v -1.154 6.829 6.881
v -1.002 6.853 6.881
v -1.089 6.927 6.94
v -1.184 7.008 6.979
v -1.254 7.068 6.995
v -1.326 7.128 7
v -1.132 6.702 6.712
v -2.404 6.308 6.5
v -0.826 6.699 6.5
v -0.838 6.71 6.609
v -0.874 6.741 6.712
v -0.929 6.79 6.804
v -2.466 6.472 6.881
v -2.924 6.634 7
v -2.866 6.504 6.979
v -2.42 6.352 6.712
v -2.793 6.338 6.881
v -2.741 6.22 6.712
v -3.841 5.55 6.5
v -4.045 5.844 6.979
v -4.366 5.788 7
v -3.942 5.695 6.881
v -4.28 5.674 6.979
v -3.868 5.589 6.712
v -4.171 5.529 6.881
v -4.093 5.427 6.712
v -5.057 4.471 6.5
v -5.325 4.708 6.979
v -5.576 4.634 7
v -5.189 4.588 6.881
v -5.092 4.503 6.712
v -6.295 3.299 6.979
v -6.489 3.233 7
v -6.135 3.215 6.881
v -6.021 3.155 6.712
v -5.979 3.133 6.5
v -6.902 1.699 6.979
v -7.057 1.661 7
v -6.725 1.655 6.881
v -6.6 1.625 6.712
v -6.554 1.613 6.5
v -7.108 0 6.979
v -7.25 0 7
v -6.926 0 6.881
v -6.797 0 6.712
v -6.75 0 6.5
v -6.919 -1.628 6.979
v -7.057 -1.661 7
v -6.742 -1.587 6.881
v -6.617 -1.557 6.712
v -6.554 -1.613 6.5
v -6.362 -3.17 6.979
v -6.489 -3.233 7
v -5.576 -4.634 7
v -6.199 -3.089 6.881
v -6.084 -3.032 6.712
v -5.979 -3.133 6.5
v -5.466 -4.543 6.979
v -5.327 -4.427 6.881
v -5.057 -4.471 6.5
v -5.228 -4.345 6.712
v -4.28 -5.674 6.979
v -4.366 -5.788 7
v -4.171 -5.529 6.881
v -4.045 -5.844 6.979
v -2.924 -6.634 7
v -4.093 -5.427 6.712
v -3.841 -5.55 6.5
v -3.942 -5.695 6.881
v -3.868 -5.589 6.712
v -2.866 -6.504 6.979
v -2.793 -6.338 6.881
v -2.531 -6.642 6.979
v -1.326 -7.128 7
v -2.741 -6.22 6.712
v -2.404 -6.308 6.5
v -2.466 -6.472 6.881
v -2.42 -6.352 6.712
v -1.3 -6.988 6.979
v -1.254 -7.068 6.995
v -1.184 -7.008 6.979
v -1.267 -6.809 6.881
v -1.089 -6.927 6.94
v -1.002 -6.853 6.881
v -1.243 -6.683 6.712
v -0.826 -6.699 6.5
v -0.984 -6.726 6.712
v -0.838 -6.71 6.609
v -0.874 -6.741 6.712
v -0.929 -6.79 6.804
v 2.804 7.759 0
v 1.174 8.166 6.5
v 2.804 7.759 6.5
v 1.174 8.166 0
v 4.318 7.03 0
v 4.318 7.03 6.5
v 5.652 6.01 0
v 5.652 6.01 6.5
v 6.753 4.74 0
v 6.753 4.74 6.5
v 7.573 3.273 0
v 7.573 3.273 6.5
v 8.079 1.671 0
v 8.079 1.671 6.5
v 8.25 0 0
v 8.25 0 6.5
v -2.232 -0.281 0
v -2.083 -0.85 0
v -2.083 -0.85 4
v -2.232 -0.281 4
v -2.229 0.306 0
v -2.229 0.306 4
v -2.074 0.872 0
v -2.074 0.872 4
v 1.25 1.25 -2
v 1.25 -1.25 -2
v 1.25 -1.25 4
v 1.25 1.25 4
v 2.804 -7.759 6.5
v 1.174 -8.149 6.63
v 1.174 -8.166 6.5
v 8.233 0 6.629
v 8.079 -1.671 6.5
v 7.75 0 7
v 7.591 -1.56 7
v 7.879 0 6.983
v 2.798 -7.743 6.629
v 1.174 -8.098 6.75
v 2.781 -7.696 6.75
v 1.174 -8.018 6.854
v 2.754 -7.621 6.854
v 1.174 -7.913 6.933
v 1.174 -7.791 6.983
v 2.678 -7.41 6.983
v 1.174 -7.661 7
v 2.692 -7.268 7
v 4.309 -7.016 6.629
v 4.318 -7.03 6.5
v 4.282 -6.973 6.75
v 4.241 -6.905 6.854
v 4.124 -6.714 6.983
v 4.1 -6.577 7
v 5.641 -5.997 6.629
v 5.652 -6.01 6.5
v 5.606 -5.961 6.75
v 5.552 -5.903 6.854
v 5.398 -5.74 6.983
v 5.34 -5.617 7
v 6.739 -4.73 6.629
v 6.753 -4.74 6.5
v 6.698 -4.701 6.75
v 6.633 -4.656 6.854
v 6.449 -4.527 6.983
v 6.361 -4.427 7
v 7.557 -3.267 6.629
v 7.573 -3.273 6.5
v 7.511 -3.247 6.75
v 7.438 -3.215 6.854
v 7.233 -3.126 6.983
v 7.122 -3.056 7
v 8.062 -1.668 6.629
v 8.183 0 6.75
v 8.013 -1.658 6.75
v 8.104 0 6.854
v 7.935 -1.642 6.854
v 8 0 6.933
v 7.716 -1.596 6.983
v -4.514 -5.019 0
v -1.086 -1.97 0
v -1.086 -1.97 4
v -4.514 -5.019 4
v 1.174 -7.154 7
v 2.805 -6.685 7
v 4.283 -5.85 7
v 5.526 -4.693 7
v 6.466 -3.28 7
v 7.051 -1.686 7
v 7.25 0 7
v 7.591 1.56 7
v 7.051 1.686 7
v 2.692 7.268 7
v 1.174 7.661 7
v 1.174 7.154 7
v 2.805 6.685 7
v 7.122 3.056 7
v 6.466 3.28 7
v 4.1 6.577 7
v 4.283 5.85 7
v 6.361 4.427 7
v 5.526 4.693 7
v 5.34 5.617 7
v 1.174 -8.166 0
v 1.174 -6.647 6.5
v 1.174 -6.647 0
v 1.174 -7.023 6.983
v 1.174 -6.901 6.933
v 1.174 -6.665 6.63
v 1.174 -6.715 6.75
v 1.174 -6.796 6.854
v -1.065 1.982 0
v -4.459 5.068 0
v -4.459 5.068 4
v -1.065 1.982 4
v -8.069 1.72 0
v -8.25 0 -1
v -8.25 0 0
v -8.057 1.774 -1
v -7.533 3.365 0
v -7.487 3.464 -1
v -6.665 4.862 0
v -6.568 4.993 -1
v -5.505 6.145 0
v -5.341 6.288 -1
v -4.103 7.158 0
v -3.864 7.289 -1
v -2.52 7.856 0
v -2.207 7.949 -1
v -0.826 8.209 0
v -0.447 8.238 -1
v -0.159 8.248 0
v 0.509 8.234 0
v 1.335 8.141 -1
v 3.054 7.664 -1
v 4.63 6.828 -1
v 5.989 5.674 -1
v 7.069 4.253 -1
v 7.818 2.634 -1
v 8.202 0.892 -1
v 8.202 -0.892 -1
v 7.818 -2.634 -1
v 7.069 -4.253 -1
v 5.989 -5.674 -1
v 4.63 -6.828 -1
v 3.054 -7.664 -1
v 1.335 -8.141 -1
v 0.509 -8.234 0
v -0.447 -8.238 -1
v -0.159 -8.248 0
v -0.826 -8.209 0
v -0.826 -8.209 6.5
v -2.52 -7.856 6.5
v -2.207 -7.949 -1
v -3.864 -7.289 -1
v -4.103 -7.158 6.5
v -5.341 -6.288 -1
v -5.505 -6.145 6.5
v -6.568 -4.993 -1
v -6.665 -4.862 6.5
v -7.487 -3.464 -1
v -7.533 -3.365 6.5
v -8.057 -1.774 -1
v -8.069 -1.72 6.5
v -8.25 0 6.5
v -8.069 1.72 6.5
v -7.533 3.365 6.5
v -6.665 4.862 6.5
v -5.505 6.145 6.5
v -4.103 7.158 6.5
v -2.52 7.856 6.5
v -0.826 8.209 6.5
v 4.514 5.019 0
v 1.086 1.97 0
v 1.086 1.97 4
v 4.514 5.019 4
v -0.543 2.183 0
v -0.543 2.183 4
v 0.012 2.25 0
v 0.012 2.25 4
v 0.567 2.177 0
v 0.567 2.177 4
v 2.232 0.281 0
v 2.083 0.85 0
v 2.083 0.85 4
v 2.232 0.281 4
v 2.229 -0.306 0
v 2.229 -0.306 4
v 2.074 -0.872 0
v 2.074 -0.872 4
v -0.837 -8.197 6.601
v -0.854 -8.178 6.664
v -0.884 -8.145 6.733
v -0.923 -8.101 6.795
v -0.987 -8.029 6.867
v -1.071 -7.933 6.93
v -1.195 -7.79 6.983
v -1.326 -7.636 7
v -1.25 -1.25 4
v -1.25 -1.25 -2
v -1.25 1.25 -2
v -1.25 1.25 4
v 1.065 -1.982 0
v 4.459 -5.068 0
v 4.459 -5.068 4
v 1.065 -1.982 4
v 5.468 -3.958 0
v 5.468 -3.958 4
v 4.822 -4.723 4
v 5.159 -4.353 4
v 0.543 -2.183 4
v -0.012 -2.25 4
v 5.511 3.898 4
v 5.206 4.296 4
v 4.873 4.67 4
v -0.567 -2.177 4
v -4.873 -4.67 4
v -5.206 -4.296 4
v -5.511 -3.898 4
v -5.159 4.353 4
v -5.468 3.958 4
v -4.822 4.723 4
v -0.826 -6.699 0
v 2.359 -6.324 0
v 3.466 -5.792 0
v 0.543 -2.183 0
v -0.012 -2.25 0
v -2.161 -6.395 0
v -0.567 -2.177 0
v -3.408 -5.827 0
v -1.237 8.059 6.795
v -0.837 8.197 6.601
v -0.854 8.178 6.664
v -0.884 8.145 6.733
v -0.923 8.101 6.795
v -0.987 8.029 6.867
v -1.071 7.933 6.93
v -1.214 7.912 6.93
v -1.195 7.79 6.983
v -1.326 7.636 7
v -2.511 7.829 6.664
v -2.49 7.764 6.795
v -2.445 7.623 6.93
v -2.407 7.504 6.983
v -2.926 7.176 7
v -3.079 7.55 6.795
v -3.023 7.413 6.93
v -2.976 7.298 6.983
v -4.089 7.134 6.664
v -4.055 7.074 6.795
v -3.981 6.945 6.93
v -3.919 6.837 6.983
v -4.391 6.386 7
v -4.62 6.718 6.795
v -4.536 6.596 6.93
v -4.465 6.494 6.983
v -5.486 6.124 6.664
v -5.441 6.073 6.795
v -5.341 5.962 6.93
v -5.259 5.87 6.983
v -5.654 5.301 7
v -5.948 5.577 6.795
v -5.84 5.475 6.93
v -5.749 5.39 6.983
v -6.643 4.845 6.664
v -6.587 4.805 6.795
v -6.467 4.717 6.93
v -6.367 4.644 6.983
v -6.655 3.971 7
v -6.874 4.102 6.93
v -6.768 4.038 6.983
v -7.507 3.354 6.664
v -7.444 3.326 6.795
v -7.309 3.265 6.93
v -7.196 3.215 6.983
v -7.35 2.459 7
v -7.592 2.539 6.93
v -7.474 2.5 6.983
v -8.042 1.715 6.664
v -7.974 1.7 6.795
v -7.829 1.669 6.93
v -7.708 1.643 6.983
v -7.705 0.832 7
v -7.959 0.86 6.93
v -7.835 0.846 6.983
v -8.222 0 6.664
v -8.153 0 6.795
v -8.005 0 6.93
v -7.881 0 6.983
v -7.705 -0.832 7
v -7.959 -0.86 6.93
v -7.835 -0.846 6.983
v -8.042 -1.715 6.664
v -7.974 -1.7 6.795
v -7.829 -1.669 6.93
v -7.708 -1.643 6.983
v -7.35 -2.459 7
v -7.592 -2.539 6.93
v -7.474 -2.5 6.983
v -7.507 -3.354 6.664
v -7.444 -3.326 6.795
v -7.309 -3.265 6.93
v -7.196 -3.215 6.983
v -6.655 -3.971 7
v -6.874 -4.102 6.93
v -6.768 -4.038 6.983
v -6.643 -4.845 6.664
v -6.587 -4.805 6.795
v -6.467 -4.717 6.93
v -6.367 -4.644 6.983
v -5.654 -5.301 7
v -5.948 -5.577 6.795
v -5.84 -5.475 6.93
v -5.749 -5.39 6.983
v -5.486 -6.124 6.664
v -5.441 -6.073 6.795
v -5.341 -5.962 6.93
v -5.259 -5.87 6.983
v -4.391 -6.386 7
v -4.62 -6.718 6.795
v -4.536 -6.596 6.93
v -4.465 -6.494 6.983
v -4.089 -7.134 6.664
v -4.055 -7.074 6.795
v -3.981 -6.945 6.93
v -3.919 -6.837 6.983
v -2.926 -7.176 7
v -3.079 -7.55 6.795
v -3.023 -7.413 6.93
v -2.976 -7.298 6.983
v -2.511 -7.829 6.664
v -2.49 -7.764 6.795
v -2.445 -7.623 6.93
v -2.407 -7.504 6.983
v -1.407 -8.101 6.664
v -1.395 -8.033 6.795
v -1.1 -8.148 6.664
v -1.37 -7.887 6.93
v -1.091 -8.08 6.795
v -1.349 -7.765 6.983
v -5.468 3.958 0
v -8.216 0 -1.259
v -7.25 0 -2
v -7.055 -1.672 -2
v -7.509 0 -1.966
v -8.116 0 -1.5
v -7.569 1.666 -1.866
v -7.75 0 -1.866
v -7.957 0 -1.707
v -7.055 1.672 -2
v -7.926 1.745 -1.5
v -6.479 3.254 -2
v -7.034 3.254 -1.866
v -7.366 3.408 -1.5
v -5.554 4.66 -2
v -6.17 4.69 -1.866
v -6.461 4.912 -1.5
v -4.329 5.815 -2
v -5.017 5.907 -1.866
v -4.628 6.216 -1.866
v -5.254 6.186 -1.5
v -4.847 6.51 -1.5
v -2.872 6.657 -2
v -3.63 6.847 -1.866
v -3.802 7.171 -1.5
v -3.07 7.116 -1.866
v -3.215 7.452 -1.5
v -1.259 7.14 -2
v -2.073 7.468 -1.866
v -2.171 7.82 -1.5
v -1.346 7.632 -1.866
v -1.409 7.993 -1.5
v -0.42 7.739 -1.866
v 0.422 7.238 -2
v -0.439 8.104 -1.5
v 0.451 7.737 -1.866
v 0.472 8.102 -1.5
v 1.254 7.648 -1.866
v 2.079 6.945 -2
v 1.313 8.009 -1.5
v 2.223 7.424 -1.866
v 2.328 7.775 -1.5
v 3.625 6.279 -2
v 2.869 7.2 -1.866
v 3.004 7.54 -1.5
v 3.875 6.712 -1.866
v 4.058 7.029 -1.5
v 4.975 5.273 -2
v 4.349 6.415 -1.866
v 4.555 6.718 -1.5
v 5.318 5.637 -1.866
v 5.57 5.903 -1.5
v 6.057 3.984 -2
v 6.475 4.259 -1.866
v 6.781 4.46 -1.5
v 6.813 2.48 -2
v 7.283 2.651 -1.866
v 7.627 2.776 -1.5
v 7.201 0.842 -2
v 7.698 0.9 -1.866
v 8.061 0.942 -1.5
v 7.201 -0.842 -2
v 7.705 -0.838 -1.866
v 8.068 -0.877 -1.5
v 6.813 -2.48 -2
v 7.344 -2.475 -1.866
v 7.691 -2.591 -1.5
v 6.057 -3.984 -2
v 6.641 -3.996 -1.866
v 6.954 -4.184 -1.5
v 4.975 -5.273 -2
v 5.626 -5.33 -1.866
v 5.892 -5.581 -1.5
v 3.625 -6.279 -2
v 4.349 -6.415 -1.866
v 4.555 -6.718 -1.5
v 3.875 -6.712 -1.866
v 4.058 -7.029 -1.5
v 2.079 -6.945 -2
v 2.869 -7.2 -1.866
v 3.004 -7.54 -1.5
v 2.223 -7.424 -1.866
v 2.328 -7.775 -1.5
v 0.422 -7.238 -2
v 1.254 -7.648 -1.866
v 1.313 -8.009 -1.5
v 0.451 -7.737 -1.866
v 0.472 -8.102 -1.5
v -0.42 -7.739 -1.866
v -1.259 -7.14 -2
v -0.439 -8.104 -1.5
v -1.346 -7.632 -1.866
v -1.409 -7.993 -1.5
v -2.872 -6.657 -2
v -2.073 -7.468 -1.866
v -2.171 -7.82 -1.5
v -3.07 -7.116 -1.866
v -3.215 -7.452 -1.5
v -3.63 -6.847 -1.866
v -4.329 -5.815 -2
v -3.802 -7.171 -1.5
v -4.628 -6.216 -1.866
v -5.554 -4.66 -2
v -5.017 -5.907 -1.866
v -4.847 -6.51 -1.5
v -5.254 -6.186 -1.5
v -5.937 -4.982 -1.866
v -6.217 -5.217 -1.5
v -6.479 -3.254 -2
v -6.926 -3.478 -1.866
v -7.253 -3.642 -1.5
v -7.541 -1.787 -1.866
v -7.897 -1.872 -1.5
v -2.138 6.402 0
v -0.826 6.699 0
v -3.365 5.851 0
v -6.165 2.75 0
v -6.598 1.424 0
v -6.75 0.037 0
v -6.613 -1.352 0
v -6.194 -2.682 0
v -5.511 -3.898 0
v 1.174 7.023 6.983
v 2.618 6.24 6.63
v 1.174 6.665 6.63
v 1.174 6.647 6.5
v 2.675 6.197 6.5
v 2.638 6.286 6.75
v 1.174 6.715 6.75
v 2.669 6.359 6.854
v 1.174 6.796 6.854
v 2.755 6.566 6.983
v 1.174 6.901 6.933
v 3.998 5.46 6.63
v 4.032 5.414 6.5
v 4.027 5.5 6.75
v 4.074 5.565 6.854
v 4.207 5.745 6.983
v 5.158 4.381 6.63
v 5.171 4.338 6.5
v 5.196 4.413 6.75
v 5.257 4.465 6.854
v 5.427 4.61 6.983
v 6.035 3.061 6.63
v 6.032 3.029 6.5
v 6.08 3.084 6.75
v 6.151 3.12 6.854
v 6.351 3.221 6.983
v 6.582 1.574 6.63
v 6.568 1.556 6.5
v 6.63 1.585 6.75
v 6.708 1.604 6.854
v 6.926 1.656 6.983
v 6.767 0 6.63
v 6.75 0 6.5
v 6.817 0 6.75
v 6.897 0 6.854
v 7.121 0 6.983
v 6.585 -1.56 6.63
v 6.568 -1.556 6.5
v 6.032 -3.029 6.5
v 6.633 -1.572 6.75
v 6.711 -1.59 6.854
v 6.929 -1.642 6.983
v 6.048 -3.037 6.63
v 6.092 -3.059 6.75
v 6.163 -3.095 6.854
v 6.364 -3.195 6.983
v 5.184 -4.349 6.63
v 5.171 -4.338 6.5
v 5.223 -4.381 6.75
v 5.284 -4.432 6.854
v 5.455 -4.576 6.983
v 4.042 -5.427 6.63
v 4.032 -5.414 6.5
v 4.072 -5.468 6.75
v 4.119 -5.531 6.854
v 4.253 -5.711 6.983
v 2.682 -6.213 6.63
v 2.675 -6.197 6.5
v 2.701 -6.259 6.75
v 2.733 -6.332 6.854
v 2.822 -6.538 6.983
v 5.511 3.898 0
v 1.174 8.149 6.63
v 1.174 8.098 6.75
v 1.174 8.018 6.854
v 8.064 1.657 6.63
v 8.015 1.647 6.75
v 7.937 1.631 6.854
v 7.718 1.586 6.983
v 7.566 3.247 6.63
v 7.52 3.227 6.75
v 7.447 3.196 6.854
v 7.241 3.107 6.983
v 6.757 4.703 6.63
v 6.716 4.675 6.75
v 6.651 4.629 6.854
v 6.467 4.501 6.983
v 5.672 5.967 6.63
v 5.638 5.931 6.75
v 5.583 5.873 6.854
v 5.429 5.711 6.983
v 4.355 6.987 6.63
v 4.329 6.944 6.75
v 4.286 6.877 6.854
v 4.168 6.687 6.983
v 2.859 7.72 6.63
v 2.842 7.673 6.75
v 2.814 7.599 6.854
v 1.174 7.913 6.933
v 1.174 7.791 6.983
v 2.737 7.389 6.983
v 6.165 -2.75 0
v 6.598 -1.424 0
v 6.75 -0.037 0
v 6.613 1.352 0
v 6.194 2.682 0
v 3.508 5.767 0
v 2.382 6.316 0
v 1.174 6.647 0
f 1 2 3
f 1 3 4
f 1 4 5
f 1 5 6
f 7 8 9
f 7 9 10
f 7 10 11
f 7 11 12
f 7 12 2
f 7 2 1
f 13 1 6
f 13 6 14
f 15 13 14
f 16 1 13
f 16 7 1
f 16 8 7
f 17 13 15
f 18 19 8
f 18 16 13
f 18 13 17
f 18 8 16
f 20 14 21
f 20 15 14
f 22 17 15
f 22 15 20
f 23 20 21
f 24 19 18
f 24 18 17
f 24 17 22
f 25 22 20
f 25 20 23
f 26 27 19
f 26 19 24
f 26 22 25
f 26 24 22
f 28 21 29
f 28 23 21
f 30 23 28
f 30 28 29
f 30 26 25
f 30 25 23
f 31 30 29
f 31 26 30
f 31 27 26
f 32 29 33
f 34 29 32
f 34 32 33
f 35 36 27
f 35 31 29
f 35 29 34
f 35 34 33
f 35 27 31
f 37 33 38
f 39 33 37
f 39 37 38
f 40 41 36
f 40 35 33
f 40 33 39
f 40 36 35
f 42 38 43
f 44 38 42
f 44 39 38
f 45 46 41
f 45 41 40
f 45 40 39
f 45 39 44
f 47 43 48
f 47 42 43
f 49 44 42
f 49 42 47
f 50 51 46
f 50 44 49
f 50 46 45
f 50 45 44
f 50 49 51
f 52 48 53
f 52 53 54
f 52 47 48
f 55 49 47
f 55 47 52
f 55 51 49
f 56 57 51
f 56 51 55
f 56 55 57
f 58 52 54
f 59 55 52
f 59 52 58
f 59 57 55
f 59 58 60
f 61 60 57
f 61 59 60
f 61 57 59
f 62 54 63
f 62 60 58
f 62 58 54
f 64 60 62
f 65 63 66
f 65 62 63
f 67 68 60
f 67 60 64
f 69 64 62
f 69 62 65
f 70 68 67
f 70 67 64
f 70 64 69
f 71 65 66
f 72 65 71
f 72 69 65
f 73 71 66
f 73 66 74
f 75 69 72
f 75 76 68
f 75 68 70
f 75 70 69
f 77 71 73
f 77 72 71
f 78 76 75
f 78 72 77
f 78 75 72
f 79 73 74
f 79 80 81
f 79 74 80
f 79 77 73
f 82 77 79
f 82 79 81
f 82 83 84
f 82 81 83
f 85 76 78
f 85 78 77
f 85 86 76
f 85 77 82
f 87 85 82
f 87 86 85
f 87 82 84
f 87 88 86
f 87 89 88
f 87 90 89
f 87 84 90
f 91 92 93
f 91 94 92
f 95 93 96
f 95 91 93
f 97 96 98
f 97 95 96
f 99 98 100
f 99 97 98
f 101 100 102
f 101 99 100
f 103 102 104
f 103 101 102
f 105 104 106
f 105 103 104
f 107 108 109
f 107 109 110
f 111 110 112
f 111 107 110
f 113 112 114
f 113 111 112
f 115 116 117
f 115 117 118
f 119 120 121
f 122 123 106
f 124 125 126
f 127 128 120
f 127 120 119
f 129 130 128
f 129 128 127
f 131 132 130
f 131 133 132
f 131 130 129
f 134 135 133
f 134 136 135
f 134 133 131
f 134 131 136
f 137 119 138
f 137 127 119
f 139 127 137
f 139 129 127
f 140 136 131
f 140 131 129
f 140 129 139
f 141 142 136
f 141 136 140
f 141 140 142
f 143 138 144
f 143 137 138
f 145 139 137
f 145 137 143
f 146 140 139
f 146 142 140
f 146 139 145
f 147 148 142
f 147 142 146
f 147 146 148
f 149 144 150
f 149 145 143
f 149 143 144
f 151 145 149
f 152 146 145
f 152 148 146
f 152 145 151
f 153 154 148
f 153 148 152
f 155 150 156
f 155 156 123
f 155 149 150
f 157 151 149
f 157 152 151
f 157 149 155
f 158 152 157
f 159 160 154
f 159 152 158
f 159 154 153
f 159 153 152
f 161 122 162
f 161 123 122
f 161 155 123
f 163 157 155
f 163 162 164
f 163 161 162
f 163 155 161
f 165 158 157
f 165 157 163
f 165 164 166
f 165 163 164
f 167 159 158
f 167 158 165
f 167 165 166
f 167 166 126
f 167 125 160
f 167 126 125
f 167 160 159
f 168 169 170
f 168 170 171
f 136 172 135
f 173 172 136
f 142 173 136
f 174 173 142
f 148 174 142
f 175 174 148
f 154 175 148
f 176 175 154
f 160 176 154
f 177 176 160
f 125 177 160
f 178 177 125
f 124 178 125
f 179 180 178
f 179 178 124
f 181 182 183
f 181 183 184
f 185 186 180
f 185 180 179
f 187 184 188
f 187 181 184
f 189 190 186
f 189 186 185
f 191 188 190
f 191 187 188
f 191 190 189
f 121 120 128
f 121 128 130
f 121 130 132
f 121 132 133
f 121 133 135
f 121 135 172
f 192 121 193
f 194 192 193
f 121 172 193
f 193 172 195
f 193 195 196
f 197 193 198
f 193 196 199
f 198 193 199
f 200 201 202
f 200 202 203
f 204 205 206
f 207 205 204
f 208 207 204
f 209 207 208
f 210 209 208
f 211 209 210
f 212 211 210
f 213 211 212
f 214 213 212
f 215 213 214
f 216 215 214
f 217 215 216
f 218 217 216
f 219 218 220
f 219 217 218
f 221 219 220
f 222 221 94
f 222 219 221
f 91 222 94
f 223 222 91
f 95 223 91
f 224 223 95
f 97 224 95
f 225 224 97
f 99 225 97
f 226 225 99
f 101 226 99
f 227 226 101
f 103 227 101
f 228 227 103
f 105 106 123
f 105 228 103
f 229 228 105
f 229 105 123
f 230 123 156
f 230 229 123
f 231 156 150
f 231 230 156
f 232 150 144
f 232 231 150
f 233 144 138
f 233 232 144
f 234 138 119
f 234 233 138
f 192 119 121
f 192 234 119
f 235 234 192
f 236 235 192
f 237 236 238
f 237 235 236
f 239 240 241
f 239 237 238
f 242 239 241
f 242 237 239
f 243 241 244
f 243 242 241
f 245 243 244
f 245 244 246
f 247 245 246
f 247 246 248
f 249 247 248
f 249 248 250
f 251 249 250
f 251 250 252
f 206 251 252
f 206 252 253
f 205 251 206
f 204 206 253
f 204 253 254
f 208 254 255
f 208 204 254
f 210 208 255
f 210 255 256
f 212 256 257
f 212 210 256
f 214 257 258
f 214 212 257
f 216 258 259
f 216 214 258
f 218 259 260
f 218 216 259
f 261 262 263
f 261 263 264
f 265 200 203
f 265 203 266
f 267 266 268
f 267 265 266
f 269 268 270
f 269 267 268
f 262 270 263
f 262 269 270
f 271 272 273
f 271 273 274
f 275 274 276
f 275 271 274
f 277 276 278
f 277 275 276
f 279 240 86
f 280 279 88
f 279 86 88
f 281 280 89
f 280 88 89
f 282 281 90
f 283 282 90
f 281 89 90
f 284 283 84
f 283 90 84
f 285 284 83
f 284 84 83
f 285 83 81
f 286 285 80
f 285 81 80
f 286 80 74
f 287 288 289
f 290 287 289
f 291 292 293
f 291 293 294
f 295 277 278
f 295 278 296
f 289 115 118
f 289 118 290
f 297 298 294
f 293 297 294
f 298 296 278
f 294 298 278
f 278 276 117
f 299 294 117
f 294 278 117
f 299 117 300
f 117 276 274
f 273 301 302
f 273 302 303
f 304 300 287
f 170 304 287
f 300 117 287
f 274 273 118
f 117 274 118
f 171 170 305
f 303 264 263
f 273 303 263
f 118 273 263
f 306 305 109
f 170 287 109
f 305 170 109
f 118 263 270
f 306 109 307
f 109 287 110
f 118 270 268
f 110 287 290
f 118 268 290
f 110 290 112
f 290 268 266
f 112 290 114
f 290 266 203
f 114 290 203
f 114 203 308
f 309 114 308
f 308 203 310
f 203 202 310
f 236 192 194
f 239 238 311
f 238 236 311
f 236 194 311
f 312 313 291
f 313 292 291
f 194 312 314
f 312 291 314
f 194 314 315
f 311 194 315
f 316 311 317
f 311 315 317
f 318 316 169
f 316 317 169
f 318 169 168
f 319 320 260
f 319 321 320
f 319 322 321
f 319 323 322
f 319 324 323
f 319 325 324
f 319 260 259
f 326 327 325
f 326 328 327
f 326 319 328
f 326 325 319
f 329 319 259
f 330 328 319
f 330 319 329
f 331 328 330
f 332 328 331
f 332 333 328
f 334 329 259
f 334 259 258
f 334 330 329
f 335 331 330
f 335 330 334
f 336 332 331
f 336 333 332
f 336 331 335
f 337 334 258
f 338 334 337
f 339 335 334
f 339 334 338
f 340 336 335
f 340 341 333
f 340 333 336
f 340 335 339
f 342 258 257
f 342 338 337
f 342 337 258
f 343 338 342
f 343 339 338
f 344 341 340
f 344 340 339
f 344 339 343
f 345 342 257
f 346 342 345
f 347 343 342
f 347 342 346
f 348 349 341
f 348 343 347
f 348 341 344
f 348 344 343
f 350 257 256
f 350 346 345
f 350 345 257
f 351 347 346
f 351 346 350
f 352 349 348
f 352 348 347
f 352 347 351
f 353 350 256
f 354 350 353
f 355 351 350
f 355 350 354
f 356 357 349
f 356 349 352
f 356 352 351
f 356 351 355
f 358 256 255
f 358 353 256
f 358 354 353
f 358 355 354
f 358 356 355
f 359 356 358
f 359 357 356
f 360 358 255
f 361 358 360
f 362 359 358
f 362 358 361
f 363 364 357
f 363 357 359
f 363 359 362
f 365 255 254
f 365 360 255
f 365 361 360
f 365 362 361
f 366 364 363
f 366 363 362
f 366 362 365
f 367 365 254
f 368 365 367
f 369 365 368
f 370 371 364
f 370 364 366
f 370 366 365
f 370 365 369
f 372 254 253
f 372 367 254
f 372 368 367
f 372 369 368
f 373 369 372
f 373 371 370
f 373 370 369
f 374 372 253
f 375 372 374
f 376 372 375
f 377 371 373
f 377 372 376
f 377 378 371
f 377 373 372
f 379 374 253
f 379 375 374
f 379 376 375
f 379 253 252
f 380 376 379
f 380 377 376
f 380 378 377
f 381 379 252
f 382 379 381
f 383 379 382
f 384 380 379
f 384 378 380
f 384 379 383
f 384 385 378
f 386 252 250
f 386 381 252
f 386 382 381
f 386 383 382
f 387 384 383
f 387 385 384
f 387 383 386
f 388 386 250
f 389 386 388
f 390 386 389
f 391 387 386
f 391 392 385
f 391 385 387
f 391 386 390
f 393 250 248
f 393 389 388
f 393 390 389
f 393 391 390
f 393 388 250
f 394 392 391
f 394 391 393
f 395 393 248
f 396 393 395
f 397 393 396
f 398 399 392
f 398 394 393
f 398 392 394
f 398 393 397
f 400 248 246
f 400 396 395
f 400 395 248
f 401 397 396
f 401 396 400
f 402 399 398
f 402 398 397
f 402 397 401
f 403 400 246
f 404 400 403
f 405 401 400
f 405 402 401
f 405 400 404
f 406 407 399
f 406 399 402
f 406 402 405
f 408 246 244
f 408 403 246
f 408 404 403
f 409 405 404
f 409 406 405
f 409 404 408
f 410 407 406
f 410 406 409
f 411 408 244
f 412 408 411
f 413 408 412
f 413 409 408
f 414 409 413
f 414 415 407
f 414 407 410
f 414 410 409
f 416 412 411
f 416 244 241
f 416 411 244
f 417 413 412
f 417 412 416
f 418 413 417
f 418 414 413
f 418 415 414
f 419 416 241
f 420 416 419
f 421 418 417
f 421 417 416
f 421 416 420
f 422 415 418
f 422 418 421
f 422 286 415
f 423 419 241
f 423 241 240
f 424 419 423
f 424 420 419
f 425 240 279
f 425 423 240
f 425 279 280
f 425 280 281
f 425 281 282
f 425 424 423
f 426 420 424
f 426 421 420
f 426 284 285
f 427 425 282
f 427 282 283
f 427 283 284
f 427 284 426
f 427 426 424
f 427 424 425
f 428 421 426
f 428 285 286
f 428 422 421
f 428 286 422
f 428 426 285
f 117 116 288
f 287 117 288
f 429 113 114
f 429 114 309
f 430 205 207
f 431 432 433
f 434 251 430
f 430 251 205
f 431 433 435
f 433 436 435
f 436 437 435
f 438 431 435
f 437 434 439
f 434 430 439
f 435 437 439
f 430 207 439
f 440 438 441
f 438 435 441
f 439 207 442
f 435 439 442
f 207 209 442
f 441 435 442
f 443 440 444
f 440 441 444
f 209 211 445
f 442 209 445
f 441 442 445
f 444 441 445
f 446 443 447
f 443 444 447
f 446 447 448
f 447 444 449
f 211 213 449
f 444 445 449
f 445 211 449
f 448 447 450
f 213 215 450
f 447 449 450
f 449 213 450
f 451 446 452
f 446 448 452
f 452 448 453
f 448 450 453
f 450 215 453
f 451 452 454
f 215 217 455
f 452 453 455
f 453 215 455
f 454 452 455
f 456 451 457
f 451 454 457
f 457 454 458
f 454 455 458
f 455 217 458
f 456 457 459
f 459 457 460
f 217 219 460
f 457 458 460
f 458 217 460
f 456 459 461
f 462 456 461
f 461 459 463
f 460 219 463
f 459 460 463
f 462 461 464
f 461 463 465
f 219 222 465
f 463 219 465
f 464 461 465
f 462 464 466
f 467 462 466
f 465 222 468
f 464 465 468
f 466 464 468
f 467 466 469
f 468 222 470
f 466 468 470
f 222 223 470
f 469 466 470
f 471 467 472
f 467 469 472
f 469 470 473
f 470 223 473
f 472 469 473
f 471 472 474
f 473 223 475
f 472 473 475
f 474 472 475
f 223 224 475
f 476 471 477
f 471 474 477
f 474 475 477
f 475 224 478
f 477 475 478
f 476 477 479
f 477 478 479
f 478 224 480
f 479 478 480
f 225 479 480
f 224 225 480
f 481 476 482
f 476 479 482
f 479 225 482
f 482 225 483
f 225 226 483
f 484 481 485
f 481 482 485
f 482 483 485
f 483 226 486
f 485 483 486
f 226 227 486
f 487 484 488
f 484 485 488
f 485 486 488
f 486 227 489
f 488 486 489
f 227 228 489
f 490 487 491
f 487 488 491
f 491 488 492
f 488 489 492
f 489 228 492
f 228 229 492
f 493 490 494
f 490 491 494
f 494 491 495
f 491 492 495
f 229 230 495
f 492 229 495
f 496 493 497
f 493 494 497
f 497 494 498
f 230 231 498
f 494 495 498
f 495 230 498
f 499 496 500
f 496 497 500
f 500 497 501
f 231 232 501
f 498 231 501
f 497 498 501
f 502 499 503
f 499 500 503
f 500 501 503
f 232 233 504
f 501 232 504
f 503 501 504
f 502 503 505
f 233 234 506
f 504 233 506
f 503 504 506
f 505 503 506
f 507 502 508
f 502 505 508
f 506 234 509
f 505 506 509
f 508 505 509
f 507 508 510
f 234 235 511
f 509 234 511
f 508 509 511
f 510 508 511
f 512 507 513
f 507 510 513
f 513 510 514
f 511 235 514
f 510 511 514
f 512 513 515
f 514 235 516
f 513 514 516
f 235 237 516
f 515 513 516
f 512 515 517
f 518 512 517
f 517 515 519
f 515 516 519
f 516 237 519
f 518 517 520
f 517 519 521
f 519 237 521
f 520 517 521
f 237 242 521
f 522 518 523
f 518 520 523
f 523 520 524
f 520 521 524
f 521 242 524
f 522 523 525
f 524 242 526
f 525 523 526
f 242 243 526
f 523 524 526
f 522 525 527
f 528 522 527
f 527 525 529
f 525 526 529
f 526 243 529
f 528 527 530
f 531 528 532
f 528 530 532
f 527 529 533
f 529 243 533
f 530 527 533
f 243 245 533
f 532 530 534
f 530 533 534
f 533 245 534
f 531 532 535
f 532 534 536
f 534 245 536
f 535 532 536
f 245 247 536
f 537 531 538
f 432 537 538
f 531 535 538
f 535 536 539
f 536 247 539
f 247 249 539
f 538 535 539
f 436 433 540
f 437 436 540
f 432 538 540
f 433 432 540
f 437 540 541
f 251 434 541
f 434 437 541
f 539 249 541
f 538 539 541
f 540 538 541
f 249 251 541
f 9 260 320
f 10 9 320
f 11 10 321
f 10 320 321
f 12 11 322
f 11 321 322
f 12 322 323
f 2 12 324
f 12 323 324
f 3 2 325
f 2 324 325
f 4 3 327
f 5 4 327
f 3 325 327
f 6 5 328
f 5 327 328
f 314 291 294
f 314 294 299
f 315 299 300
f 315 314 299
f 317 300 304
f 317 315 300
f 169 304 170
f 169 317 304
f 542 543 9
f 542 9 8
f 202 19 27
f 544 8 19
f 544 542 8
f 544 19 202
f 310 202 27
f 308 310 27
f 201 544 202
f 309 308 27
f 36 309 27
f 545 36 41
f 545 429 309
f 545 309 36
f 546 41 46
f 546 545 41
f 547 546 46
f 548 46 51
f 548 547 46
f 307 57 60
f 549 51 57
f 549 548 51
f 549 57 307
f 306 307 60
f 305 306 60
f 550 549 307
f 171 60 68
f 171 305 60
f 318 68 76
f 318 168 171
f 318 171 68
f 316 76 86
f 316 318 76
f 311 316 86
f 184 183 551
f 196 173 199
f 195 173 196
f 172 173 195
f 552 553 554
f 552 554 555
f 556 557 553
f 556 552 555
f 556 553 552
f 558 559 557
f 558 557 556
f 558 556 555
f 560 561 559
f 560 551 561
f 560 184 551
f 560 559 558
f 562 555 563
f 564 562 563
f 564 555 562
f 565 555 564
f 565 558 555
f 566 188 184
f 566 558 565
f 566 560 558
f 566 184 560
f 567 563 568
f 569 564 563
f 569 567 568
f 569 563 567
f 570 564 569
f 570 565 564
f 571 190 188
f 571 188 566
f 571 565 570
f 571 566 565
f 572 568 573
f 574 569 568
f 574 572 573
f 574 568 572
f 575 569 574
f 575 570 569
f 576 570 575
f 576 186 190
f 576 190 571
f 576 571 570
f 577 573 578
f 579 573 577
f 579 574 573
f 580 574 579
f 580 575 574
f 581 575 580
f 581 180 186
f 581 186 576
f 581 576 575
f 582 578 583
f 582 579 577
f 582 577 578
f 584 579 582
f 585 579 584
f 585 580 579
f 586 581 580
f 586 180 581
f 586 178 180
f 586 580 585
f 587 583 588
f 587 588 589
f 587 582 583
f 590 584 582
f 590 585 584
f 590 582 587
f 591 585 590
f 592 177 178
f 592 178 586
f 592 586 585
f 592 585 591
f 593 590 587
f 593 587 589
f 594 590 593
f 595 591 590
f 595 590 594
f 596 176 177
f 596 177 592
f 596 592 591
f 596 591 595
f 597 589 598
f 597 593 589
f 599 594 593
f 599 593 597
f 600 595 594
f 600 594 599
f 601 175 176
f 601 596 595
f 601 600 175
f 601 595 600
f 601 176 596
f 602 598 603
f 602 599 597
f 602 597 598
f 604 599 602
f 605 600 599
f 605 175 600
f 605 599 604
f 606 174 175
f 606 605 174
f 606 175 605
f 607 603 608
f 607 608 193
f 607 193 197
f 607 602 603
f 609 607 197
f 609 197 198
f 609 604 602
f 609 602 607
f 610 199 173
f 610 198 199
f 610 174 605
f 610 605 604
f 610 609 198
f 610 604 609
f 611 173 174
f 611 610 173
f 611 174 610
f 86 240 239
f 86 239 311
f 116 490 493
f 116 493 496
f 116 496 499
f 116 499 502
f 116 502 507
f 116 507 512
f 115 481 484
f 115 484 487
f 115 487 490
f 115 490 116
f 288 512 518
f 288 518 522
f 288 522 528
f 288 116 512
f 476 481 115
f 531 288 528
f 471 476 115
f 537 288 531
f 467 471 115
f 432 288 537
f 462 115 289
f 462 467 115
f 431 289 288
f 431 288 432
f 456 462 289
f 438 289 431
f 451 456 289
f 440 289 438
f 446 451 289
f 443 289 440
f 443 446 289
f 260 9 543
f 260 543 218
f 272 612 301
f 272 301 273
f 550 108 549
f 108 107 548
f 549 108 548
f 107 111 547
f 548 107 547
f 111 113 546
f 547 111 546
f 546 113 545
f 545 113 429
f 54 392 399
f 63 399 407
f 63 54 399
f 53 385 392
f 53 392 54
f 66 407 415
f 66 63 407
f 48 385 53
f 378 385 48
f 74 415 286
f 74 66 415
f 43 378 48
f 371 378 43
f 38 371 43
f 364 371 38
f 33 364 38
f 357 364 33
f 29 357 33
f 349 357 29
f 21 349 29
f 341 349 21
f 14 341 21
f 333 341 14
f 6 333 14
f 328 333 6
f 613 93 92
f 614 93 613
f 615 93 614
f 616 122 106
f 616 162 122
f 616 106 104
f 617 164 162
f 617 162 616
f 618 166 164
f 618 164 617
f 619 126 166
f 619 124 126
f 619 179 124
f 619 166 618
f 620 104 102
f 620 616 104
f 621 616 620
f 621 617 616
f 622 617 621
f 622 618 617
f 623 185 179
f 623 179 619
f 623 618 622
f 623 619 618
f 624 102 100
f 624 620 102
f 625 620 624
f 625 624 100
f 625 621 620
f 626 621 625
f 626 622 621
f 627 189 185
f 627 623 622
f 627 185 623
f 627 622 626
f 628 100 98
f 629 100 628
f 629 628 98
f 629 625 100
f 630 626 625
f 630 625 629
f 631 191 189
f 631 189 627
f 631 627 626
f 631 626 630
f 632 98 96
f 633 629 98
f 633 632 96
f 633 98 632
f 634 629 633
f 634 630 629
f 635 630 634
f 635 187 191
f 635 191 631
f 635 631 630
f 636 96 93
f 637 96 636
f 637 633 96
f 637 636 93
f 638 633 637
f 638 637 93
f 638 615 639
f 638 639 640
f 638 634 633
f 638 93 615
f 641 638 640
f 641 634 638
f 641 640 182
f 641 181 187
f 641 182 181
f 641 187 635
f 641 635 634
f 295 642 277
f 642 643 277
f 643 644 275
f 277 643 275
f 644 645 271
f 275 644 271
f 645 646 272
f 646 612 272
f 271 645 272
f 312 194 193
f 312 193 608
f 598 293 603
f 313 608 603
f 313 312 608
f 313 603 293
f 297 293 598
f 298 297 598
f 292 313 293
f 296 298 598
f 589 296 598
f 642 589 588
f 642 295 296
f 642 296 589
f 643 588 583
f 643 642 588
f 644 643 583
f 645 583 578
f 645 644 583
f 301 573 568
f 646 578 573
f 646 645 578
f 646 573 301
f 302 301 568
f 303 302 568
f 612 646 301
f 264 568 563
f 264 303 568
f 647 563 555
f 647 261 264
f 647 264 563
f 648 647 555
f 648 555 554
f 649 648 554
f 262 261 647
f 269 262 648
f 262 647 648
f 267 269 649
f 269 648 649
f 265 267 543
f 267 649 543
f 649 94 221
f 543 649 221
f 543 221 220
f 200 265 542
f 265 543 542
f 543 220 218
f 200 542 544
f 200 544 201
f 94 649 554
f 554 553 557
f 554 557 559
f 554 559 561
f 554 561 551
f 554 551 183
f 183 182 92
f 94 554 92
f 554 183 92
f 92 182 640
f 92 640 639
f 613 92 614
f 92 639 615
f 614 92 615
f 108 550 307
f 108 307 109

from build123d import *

# Parameters (mm, degrees)
SKETCH_1_R          = 8.25
SKETCH_1_R_2        = 6.75
EXTRUDE_1_DEPTH     = 7
EXTRUDE_START       = 2
SKETCH_2_R          = 8.25
EXTRUDE_1_2_DEPTH   = 2
EXTRUDE_3_DEPTH     = 4
SKETCH_3_W          = 2.5
SKETCH_3_H          = 2.5
CUT_EXTRUDE_1_DEPTH = 15.735162028
SKETCH_6_W          = 2
SKETCH_6_H          = 3.283082556
SKETCH_6_H_2        = 3.547491889
CUT_EXTRUDE_2_DEPTH = 7
FILLET_1_R          = 1
FILLET_2_R          = 0.5


with BuildPart() as part:
    # Эскиз1 → Extrude 1 (new body)
    with BuildSketch(Plane.XY):
        Circle(SKETCH_1_R)
        Circle(SKETCH_1_R_2, mode=Mode.SUBTRACT)
    extrude(amount=EXTRUDE_1_DEPTH)

    # Эскиз2 → Extrude 1 2 (add)
    with BuildSketch(Plane(origin=(0, 0, 0), x_dir=(-1, 0, 0), z_dir=(0, 0, -1)).offset(EXTRUDE_START)):
        Circle(SKETCH_2_R)
    extrude(amount=-EXTRUDE_1_2_DEPTH)

    # Эскиз4 → Бобышка-Вытянуть3 (add)
    with BuildSketch(Plane.XY):
        with BuildLine():
            Line((2.07406055, -0.872222927), (5.968591922, -4.413472559))
            Line((5.968591922, -4.413472559), (4.959463137, -5.523273935))
            Line((4.959463137, -5.523273935), (1.064931765, -1.982024303))
            ThreePointArc((1.064931765, -1.982024303), (-0.012257169, -2.249966613), (-1.08646291, -1.970304125))
            Line((-1.08646291, -1.970304125), (-4.961140395, -5.41713434))
            Line((-4.961140395, -5.41713434), (-5.958117889, -4.296404276))
            Line((-5.958117889, -4.296404276), (-2.083440404, -0.849574061))
            ThreePointArc((-2.083440404, -0.849574061), (-2.249966613, 0.012257169), (-2.07406055, 0.872222927))
            Line((-2.07406055, 0.872222927), (-5.968591922, 4.413472559))
            Line((-5.968591922, 4.413472559), (-4.959463137, 5.523273935))
            Line((-4.959463137, 5.523273935), (-1.064931765, 1.982024303))
            ThreePointArc((-1.064931765, 1.982024303), (0.012257169, 2.249966613), (1.08646291, 1.970304125))
            Line((1.08646291, 1.970304125), (4.961140395, 5.41713434))
            Line((4.961140395, 5.41713434), (5.958117889, 4.296404276))
            Line((5.958117889, 4.296404276), (2.083440404, 0.849574061))
            ThreePointArc((2.083440404, 0.849574061), (2.249966613, -0.012257169), (2.07406055, -0.872222927))
        make_face()
    extrude(amount=EXTRUDE_3_DEPTH)

    # Эскиз3 → Вырез-Вытянуть1 (cut, through all)
    with BuildSketch(Plane(origin=(0, 0, -2), x_dir=(-1, 0, 0), z_dir=(0, 0, -1))):
        Rectangle(SKETCH_3_W, SKETCH_3_H)
    extrude(amount=-CUT_EXTRUDE_1_DEPTH, mode=Mode.SUBTRACT)

    # Эскиз6 → Вырез-Вытянуть2 (cut)
    with BuildSketch(Plane.XY.offset(7)):
        with Locations((0.173720833, 7.205154333)):
            Rectangle(SKETCH_6_W, SKETCH_6_H)
        with Locations((0.173720833, -7.513631889)):
            Rectangle(SKETCH_6_W, SKETCH_6_H_2)
    extrude(amount=-CUT_EXTRUDE_2_DEPTH, mode=Mode.SUBTRACT)

    # Скругление1
    fillet_1_edges = [part.edges().sort_by_distance(p)[0] for p in [
        (8.25, 0, -2),
    ]]
    fillet(fillet_1_edges, radius=FILLET_1_R)

    # Скругление2
    # the kernel refuses this fillet: 0.5 mm, written as the material it takes off along each edge
    with BuildSketch(Plane(origin=(0, 0, 7), x_dir=(1, 0, 0), z_dir=(0, -1, 0))) as fillet_2_piece_1:
        with BuildLine():
            CenterArc((8.25 - FILLET_2_R, -FILLET_2_R), FILLET_2_R, 0, 90)
            Line((8.25, -FILLET_2_R), (8.25, 0))
            Line((8.25, 0), (8.25 - FILLET_2_R, 0))
        make_face()
    revolve(axis=Axis((0, 0, 7), (0, 0, 1)), revolution_arc=90.504884873, mode=Mode.SUBTRACT)
    with BuildSketch(Plane(origin=(0, 0, 7), x_dir=(0.06267760440756695, 0.9980338260328296, 0), z_dir=(0.9980338260328296, -0.06267760440756695, 0))) as fillet_2_piece_2:
        with BuildLine():
            CenterArc((6.75 + FILLET_2_R, -FILLET_2_R), FILLET_2_R, 90, 90)
            Line((6.75 + FILLET_2_R, 0), (6.75, 0))
            Line((6.75, 0), (6.75, -FILLET_2_R))
        make_face()
    revolve(axis=Axis((0, 0, 7), (0, 0, 1)), revolution_arc=187.187035343, mode=Mode.SUBTRACT)
    with BuildSketch(Plane(origin=(0, 0, 7), x_dir=(-0.01064718913448663, 0.9999433170752903, 0), z_dir=(-0.9999433170752903, -0.01064718913448663, 0))) as fillet_2_piece_3:
        with BuildLine():
            CenterArc((6.75 + FILLET_2_R, FILLET_2_R), FILLET_2_R, 180, 90)
            Line((6.75 + FILLET_2_R, 0), (6.75, 0))
            Line((6.75, 0), (6.75, FILLET_2_R))
        make_face()
    revolve(axis=Axis((0, 0, 7), (0, 0, -1)), revolution_arc=181.220101055, mode=Mode.SUBTRACT)
    with BuildSketch(Plane(origin=(-0.826279167, 9.458517694, 7), x_dir=(0, 0, -1), z_dir=(0, -1, 0))) as fillet_2_piece_4:
        with BuildLine():
            CenterArc((FILLET_2_R, -FILLET_2_R), FILLET_2_R, 90, 90)
            Line((0, -FILLET_2_R), (0, 0))
            Line((0, 0), (FILLET_2_R, 0))
        make_face()
    extrude(amount=4.009281713, mode=Mode.SUBTRACT)
    with BuildSketch(Plane(origin=(-0.826279167, -5.449235982, 7), x_dir=(-1, 0, 0), z_dir=(0, -1, 0))) as fillet_2_piece_5:
        with BuildLine():
            CenterArc((FILLET_2_R, FILLET_2_R), FILLET_2_R, 180, 90)
            Line((0, FILLET_2_R), (0, 0))
            Line((0, 0), (FILLET_2_R, 0))
        make_face()
    extrude(amount=4.009281713, mode=Mode.SUBTRACT)
    with BuildSketch(Plane(origin=(0, 0, 7), x_dir=(0.05138276513110792, 0.9986790332471597, 0), z_dir=(0.9986790332471597, -0.05138276513110792, 0))) as fillet_2_piece_6:
        with BuildLine():
            CenterArc((8.25 - FILLET_2_R, -FILLET_2_R), FILLET_2_R, 0, 90)
            Line((8.25 - FILLET_2_R, 0), (8.25, 0))
            Line((8.25, 0), (8.25, -FILLET_2_R))
        make_face()
    revolve(axis=Axis((0, 0, 7), (0, 0, 1)), revolution_arc=185.890625165, mode=Mode.SUBTRACT)
    with BuildSketch(Plane(origin=(0, 0, 7), x_dir=(-0.008811789331912054, -0.9999611754307114, 0), z_dir=(-0.9999611754307114, 0.008811789331912054, 0))) as fillet_2_piece_7:
        with BuildLine():
            CenterArc((8.25 - FILLET_2_R, -FILLET_2_R), FILLET_2_R, 0, 90)
            Line((8.25 - FILLET_2_R, 0), (8.25, 0))
            Line((8.25, 0), (8.25, -FILLET_2_R))
        make_face()
    revolve(axis=Axis((0, 0, 7), (0, 0, 1)), revolution_arc=90.504884873, mode=Mode.SUBTRACT)


solid = part.part
